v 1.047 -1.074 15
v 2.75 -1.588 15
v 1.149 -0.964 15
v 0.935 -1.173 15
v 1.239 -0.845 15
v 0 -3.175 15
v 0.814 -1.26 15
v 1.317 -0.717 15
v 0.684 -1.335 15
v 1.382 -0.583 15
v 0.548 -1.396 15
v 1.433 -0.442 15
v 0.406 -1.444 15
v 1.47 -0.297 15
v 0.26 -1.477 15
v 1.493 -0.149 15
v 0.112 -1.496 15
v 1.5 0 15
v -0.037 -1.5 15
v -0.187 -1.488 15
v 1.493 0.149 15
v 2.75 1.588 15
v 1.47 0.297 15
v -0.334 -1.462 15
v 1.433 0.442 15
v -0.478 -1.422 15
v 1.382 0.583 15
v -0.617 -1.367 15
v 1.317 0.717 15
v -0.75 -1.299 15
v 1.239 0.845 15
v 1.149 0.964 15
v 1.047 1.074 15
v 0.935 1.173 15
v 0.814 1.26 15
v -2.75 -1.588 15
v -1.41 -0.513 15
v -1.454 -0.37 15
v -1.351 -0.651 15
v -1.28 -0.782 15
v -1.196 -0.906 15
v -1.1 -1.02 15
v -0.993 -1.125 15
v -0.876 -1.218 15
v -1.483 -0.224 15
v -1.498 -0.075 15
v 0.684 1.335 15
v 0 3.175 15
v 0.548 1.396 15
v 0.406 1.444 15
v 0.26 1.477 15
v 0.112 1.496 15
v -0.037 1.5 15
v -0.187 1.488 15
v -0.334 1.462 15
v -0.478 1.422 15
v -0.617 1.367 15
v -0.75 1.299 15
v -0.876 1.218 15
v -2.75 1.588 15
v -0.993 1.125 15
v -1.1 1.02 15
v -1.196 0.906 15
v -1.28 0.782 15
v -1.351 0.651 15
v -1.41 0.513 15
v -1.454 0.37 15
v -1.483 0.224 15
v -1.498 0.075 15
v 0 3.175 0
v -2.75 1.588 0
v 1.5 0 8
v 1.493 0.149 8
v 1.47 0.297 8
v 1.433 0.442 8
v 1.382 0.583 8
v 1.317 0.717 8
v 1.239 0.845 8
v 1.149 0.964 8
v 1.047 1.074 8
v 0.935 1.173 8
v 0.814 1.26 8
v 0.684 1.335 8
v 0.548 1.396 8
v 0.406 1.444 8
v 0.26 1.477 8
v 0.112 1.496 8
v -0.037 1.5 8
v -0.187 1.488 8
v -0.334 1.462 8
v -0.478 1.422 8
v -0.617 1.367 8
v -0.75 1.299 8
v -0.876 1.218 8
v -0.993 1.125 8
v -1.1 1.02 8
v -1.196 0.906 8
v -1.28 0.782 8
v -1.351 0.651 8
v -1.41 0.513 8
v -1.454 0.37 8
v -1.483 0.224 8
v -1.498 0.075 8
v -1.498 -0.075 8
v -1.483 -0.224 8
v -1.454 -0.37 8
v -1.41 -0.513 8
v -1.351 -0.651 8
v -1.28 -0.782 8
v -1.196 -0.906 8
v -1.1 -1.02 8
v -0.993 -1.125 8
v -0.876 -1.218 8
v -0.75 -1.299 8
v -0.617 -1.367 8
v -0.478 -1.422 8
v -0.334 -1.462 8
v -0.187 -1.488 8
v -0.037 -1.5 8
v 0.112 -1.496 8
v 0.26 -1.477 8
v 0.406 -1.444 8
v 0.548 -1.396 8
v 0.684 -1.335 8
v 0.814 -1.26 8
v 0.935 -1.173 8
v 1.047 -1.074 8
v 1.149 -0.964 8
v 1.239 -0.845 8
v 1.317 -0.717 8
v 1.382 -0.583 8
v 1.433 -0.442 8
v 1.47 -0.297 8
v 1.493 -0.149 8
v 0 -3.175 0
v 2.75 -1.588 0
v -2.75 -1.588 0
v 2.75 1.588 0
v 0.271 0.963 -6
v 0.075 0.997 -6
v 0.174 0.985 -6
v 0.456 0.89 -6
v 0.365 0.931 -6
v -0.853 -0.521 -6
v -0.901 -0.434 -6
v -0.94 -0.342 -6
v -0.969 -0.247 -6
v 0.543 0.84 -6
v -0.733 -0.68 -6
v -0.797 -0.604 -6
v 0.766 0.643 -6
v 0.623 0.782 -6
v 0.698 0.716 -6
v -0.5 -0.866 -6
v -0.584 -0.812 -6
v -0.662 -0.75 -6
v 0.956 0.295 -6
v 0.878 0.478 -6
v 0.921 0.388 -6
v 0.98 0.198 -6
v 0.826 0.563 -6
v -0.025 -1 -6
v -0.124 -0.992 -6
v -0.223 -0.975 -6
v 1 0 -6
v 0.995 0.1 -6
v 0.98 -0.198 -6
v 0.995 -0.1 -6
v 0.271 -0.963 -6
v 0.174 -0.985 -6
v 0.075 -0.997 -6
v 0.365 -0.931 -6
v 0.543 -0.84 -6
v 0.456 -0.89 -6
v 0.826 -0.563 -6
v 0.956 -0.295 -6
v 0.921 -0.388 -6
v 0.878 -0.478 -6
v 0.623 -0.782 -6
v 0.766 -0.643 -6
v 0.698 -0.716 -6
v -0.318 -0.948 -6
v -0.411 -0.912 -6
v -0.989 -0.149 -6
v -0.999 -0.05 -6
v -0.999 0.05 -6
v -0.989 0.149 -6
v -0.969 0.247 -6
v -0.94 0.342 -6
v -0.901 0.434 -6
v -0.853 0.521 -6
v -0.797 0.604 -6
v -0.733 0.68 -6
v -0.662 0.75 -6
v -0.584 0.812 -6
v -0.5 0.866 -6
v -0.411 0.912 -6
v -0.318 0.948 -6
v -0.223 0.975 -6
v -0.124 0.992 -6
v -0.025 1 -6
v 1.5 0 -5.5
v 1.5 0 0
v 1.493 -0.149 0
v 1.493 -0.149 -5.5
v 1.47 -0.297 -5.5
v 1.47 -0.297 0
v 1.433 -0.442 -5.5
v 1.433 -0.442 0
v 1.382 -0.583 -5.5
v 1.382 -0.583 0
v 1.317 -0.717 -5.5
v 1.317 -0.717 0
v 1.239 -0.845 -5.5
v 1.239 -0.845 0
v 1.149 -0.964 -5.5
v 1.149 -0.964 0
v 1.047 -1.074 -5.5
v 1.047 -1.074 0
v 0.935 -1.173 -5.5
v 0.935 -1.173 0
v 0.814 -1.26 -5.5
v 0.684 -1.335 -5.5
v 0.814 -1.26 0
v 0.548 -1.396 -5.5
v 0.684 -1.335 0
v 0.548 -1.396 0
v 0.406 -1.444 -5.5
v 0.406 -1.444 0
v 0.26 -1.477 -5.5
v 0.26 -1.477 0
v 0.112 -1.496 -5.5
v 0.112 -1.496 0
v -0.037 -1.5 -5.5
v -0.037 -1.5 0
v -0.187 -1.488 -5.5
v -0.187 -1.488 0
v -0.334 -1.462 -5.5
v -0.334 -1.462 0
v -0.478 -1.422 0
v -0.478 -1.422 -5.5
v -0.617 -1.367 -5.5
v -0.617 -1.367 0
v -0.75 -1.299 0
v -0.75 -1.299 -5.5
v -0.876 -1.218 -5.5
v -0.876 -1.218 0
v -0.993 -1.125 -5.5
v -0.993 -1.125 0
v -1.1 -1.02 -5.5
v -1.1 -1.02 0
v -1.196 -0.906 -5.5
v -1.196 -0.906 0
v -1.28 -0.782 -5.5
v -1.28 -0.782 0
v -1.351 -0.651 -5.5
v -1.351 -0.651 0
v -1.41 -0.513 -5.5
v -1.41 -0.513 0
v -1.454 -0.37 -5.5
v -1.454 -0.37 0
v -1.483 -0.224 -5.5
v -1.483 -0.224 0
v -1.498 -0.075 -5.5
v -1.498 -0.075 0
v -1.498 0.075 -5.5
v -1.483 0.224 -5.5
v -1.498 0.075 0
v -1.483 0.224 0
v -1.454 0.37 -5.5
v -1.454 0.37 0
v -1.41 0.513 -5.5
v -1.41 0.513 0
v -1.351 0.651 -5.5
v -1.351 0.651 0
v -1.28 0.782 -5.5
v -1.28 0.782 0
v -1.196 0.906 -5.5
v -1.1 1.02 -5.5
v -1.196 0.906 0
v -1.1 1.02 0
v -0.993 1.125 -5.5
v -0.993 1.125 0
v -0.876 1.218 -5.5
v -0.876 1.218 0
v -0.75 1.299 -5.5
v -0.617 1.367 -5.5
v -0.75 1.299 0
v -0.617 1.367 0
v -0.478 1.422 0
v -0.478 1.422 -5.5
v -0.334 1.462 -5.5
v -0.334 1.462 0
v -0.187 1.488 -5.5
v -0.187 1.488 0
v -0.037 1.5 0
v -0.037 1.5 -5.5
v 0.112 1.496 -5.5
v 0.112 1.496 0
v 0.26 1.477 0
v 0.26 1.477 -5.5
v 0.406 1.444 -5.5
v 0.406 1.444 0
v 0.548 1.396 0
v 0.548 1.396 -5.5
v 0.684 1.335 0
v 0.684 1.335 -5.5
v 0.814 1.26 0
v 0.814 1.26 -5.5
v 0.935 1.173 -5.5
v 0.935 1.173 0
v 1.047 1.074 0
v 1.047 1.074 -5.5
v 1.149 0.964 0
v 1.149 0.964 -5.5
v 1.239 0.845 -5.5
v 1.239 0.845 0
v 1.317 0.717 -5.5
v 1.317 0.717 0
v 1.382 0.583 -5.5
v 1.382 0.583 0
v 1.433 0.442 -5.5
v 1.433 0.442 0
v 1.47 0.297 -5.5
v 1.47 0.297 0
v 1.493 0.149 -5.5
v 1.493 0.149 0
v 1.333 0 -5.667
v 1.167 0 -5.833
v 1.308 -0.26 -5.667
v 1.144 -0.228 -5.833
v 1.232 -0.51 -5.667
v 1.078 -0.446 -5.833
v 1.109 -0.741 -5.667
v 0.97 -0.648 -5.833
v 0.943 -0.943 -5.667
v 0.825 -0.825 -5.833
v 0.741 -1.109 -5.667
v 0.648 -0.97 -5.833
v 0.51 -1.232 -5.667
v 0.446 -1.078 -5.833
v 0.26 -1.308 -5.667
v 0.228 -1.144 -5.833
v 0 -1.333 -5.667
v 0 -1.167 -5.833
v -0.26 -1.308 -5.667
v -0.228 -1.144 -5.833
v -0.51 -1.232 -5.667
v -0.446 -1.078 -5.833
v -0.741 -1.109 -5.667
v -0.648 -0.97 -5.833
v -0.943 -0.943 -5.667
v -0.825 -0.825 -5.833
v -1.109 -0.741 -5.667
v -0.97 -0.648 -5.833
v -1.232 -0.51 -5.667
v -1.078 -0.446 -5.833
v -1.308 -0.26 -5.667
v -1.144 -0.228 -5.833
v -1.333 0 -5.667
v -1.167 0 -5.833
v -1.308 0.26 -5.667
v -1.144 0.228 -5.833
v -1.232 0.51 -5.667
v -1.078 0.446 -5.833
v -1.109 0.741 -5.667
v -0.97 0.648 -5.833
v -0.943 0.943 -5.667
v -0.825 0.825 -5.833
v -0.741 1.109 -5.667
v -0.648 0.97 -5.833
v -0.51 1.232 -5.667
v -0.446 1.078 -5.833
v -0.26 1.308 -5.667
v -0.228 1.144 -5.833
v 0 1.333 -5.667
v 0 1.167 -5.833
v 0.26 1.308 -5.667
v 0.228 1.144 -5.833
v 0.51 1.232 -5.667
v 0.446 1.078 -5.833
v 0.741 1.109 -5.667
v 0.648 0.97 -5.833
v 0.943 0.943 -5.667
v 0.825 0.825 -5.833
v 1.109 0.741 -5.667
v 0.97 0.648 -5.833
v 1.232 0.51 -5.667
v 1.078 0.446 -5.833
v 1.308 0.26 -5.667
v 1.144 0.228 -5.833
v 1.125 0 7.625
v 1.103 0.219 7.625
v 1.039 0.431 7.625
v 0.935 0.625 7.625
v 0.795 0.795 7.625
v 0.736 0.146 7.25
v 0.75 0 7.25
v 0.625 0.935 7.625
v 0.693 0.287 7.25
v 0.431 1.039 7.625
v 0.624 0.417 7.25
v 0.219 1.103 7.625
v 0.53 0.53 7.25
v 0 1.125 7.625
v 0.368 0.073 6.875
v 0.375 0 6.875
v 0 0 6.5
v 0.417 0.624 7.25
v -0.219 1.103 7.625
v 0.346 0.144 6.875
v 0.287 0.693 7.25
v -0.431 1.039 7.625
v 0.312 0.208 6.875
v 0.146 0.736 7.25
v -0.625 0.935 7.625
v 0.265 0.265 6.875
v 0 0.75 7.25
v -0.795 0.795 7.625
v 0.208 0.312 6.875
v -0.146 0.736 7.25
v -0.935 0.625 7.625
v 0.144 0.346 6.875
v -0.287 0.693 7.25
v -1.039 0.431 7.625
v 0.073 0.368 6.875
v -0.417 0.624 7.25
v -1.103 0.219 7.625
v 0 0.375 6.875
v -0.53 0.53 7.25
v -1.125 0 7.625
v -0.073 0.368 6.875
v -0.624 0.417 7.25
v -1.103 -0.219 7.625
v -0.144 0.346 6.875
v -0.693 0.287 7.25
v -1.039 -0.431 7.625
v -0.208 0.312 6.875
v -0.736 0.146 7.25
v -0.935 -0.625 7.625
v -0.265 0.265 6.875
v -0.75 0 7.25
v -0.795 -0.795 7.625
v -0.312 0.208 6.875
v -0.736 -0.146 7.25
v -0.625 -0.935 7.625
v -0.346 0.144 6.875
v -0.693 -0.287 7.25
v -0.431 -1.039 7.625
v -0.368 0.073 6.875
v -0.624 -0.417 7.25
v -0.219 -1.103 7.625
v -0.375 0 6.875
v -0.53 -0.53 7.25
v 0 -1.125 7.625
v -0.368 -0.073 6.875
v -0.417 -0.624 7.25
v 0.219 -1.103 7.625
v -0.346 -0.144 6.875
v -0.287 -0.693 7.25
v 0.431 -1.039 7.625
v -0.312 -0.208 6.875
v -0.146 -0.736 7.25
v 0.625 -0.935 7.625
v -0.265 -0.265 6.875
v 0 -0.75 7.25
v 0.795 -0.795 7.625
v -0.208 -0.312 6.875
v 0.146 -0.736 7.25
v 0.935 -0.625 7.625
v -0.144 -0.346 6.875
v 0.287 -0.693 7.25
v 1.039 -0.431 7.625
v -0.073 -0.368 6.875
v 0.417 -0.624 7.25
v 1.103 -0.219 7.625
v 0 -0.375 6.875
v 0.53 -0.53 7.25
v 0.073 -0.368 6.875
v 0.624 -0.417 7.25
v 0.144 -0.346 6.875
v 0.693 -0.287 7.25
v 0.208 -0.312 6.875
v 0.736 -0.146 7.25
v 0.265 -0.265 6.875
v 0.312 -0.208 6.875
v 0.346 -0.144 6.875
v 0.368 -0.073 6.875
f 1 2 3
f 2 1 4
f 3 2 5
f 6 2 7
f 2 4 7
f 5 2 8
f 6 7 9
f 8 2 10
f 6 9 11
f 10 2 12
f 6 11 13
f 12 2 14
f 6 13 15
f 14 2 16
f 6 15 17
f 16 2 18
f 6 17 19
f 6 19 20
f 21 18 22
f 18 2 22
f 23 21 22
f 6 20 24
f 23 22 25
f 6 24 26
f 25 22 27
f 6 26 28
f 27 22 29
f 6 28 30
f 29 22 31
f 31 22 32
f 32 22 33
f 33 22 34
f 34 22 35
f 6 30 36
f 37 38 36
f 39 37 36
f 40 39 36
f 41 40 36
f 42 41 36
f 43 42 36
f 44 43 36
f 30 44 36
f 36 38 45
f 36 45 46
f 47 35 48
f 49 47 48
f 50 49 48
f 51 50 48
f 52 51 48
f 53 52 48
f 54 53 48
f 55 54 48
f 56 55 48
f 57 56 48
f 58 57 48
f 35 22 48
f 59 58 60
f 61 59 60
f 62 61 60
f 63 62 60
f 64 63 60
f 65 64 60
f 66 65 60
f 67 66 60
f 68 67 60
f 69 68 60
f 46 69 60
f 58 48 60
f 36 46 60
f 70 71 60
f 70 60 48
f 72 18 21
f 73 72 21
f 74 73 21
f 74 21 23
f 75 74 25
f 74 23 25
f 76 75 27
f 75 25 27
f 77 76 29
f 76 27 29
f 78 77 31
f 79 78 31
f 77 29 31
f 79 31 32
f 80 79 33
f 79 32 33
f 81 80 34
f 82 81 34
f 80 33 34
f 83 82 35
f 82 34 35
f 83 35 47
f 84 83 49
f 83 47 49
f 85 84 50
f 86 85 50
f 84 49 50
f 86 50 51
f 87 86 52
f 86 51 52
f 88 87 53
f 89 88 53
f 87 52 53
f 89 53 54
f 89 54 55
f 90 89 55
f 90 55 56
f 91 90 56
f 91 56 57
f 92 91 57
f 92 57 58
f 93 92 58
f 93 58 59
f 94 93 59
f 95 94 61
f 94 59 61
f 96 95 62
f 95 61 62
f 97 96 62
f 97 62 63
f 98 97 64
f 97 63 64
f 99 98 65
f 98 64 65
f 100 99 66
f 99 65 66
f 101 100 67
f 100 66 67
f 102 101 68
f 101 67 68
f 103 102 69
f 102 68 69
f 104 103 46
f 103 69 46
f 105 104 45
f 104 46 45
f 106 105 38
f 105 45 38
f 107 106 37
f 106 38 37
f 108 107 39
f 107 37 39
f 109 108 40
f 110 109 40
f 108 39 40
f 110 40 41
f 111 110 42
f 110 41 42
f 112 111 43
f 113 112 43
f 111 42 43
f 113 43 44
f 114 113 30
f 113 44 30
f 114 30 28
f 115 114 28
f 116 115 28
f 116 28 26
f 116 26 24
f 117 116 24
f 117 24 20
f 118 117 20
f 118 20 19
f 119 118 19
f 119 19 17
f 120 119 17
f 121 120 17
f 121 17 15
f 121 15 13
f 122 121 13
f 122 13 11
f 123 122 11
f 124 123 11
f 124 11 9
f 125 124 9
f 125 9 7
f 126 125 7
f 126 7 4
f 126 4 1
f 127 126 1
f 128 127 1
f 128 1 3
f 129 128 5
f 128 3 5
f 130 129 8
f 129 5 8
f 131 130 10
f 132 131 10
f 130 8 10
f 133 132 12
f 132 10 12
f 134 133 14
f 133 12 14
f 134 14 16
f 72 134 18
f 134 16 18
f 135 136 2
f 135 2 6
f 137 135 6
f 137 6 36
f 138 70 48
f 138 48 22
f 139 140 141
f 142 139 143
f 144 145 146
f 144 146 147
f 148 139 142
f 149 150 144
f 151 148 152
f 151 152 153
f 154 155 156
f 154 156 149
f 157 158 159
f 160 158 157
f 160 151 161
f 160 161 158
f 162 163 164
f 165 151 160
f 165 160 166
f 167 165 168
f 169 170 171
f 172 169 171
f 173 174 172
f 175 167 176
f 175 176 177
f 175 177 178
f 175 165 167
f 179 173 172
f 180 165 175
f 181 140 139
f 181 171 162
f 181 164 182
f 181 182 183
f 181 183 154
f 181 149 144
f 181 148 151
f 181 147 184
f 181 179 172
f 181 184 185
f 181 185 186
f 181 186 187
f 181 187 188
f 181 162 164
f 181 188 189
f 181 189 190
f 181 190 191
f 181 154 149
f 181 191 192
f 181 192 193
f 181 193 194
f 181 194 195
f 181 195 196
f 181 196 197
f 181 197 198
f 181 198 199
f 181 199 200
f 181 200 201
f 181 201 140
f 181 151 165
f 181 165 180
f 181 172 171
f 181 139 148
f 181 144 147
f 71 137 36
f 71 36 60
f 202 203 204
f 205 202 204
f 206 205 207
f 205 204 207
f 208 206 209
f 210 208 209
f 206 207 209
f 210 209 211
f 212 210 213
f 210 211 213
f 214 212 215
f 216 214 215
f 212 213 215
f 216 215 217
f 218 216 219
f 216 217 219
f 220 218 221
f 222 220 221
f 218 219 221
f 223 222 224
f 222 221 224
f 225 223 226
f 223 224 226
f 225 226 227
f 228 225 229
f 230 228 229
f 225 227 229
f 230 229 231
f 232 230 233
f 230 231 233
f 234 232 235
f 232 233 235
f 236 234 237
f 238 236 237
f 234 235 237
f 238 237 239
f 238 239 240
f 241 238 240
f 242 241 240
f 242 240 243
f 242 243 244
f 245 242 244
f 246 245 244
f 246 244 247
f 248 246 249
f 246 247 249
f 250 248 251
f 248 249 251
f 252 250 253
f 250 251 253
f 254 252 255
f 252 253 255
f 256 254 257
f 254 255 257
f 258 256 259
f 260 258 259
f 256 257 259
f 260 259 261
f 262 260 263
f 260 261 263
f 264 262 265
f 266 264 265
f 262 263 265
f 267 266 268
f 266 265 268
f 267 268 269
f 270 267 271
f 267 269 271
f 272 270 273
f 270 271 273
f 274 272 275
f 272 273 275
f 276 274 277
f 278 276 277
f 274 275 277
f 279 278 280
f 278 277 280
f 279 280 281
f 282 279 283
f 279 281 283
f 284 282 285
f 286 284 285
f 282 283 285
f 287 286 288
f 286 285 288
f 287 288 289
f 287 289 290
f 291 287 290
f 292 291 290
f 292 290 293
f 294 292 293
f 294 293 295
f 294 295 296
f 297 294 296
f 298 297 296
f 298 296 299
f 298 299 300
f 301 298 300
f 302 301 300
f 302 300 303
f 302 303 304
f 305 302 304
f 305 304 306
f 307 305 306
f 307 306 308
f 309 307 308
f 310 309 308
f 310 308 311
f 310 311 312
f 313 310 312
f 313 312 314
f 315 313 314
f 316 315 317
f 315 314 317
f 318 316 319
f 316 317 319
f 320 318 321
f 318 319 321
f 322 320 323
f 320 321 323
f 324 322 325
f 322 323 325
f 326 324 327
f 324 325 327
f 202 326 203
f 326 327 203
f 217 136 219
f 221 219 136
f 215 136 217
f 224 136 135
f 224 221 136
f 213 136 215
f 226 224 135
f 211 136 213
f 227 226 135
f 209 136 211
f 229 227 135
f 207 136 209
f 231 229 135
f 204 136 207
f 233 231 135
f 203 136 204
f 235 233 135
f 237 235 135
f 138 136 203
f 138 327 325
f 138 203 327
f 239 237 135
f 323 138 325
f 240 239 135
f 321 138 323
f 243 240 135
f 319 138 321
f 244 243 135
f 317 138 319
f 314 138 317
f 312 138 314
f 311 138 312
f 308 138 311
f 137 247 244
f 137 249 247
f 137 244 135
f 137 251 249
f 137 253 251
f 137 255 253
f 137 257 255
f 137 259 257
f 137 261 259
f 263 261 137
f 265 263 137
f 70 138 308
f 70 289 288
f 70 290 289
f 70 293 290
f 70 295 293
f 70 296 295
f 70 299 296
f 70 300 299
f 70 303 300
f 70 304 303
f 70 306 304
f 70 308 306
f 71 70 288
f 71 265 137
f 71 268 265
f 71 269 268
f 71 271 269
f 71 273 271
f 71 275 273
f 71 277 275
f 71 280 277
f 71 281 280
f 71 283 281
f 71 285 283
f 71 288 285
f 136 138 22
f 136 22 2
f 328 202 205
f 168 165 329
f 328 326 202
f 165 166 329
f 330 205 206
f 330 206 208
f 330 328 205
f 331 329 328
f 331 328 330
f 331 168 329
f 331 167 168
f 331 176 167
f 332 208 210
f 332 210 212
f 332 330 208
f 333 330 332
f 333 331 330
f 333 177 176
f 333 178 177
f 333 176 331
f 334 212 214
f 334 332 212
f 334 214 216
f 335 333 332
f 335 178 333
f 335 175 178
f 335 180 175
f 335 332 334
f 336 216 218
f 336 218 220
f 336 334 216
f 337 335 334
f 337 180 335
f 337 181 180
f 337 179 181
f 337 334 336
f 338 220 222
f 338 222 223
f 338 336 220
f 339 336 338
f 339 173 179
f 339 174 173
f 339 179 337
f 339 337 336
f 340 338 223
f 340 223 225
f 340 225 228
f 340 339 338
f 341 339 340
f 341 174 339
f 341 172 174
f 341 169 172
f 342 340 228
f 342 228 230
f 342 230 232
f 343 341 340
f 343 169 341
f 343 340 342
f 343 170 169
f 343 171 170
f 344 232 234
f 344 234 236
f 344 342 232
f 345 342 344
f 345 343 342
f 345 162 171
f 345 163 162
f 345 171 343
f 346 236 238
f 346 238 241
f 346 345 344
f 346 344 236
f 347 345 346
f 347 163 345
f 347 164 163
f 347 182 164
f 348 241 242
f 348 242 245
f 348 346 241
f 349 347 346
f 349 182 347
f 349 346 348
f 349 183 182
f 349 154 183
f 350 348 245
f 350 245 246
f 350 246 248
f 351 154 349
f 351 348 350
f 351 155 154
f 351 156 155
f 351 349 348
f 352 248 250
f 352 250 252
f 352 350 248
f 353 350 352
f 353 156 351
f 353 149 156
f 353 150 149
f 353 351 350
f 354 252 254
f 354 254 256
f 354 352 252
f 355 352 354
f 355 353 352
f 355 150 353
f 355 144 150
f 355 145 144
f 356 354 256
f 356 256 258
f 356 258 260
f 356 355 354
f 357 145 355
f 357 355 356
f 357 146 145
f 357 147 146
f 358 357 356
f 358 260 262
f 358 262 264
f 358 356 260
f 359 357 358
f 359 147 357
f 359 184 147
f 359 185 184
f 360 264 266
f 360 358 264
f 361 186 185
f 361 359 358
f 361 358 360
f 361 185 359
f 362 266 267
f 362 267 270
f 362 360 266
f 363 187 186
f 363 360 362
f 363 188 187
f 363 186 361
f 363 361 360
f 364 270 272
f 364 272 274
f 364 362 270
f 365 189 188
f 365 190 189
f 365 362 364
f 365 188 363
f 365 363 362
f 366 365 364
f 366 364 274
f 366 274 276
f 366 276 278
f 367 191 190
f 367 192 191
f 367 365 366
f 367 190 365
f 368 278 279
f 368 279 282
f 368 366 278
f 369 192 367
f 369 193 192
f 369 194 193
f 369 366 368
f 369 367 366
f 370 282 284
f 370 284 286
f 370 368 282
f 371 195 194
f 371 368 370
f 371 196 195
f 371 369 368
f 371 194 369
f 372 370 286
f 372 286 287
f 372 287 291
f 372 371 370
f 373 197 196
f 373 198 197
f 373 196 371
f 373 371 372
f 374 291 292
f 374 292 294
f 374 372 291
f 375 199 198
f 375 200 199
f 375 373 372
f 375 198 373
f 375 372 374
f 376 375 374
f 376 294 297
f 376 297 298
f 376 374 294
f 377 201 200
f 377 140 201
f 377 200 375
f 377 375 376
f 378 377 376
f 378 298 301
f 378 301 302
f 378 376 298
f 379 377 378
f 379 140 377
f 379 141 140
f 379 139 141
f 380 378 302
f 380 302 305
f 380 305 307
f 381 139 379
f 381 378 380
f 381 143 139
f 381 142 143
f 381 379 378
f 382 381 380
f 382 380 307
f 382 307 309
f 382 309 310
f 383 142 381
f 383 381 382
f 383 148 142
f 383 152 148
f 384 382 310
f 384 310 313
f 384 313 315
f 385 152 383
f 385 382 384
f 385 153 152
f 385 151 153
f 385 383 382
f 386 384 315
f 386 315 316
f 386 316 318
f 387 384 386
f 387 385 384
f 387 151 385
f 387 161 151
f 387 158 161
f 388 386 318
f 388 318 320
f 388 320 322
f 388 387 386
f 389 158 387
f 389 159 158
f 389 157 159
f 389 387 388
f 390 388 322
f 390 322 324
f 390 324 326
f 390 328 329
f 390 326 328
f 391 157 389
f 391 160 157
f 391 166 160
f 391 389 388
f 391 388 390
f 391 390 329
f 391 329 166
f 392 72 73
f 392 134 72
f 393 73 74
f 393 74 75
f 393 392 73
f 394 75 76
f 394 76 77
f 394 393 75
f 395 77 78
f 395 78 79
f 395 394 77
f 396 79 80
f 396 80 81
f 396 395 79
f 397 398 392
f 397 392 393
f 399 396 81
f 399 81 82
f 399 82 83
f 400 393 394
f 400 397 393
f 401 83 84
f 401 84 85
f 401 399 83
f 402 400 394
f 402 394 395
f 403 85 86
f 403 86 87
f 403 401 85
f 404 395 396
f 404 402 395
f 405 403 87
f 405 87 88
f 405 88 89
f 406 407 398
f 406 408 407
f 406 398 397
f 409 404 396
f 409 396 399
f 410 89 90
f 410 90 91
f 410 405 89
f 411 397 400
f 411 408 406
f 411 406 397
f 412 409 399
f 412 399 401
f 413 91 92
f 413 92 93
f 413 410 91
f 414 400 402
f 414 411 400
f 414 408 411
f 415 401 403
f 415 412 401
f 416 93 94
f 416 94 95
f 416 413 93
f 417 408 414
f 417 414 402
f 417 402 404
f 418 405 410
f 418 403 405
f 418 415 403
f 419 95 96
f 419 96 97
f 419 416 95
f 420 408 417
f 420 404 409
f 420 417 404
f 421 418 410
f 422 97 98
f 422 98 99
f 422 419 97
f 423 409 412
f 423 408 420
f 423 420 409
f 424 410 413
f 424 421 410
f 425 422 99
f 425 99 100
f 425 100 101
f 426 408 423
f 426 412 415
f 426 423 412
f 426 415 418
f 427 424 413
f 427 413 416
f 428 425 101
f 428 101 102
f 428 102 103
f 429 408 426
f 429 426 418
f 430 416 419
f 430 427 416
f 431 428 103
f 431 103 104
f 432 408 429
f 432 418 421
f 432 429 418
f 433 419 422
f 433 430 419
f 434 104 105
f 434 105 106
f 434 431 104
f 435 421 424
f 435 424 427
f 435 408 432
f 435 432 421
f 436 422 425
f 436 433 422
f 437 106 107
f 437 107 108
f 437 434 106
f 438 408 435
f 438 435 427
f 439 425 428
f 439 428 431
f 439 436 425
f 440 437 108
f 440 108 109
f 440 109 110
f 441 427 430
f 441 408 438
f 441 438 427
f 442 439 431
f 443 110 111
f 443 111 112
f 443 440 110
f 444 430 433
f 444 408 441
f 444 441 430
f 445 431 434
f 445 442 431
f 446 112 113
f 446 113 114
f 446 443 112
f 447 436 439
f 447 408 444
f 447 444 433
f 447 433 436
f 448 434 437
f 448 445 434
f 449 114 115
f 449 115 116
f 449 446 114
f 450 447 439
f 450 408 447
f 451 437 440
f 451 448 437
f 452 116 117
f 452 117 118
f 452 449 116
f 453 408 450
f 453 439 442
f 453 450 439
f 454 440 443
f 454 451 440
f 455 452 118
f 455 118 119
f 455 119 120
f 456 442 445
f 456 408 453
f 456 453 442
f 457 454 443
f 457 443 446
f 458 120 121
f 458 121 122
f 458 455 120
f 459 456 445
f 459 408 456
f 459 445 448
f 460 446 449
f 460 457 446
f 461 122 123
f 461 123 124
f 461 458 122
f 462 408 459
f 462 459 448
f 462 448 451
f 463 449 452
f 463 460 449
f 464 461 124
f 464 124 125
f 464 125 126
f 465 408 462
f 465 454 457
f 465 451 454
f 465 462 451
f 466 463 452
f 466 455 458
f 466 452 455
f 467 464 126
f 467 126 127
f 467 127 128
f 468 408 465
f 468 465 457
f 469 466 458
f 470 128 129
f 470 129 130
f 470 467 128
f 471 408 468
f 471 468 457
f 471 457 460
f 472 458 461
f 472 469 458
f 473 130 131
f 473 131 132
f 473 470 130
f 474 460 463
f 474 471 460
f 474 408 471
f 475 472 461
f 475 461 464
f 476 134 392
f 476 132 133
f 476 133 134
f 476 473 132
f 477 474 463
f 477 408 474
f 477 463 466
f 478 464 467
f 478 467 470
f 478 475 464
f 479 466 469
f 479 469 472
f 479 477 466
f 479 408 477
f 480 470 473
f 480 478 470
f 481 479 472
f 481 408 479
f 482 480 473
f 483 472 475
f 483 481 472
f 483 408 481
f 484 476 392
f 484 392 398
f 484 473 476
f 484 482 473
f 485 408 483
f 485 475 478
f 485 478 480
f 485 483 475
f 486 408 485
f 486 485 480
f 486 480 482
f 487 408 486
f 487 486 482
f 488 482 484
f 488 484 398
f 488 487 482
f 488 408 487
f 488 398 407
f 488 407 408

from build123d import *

# Parameters (mm, degrees)
PAD014_DEPTH    = 15
SKETCH032_R     = 1.5
PAD013_DEPTH    = 6
SKETCH031_R     = 1.5
POCKET012_DEPTH = 8.5
CHAMFER011_SIZE = 1.5
CHAMFER012_SIZE = 0.5


with BuildPart() as part:
    # Sketch030 → Pad014 (new body)
    with BuildSketch(Plane.XY):
        Polygon((-2.75, -1.587713), (-2.75, 1.587713), (0, 3.175426), (2.75, 1.587713), (2.75, -1.587713), (0, -3.175426), align=None)
    extrude(amount=PAD014_DEPTH)

    # Sketch032 (on Face7 of Pad014) → Pad013 (new body)
    with BuildSketch(Plane(origin=(0, 0, 0), x_dir=(1, 0, 0), z_dir=(0, 0, -1))):
        Circle(SKETCH032_R)
    extrude(amount=PAD013_DEPTH)

    # Sketch031 (on Face5 of Pad013) → Pocket012 (cut)
    with BuildSketch(Plane.XY.offset(15)):
        Circle(SKETCH031_R)
    extrude(amount=-POCKET012_DEPTH, mode=Mode.SUBTRACT)

    # Chamfer011
    chamfer011_edges = [part.edges().sort_by_distance(p)[0] for p in [
        (-1.5, 0, 6.5),
    ]]
    chamfer(chamfer011_edges, length=CHAMFER011_SIZE)

    # Chamfer012
    chamfer012_edges = [part.edges().sort_by_distance(p)[0] for p in [
        (-1.5, 0, -6),
    ]]
    chamfer(chamfer012_edges, length=CHAMFER012_SIZE)


solid = part.part
